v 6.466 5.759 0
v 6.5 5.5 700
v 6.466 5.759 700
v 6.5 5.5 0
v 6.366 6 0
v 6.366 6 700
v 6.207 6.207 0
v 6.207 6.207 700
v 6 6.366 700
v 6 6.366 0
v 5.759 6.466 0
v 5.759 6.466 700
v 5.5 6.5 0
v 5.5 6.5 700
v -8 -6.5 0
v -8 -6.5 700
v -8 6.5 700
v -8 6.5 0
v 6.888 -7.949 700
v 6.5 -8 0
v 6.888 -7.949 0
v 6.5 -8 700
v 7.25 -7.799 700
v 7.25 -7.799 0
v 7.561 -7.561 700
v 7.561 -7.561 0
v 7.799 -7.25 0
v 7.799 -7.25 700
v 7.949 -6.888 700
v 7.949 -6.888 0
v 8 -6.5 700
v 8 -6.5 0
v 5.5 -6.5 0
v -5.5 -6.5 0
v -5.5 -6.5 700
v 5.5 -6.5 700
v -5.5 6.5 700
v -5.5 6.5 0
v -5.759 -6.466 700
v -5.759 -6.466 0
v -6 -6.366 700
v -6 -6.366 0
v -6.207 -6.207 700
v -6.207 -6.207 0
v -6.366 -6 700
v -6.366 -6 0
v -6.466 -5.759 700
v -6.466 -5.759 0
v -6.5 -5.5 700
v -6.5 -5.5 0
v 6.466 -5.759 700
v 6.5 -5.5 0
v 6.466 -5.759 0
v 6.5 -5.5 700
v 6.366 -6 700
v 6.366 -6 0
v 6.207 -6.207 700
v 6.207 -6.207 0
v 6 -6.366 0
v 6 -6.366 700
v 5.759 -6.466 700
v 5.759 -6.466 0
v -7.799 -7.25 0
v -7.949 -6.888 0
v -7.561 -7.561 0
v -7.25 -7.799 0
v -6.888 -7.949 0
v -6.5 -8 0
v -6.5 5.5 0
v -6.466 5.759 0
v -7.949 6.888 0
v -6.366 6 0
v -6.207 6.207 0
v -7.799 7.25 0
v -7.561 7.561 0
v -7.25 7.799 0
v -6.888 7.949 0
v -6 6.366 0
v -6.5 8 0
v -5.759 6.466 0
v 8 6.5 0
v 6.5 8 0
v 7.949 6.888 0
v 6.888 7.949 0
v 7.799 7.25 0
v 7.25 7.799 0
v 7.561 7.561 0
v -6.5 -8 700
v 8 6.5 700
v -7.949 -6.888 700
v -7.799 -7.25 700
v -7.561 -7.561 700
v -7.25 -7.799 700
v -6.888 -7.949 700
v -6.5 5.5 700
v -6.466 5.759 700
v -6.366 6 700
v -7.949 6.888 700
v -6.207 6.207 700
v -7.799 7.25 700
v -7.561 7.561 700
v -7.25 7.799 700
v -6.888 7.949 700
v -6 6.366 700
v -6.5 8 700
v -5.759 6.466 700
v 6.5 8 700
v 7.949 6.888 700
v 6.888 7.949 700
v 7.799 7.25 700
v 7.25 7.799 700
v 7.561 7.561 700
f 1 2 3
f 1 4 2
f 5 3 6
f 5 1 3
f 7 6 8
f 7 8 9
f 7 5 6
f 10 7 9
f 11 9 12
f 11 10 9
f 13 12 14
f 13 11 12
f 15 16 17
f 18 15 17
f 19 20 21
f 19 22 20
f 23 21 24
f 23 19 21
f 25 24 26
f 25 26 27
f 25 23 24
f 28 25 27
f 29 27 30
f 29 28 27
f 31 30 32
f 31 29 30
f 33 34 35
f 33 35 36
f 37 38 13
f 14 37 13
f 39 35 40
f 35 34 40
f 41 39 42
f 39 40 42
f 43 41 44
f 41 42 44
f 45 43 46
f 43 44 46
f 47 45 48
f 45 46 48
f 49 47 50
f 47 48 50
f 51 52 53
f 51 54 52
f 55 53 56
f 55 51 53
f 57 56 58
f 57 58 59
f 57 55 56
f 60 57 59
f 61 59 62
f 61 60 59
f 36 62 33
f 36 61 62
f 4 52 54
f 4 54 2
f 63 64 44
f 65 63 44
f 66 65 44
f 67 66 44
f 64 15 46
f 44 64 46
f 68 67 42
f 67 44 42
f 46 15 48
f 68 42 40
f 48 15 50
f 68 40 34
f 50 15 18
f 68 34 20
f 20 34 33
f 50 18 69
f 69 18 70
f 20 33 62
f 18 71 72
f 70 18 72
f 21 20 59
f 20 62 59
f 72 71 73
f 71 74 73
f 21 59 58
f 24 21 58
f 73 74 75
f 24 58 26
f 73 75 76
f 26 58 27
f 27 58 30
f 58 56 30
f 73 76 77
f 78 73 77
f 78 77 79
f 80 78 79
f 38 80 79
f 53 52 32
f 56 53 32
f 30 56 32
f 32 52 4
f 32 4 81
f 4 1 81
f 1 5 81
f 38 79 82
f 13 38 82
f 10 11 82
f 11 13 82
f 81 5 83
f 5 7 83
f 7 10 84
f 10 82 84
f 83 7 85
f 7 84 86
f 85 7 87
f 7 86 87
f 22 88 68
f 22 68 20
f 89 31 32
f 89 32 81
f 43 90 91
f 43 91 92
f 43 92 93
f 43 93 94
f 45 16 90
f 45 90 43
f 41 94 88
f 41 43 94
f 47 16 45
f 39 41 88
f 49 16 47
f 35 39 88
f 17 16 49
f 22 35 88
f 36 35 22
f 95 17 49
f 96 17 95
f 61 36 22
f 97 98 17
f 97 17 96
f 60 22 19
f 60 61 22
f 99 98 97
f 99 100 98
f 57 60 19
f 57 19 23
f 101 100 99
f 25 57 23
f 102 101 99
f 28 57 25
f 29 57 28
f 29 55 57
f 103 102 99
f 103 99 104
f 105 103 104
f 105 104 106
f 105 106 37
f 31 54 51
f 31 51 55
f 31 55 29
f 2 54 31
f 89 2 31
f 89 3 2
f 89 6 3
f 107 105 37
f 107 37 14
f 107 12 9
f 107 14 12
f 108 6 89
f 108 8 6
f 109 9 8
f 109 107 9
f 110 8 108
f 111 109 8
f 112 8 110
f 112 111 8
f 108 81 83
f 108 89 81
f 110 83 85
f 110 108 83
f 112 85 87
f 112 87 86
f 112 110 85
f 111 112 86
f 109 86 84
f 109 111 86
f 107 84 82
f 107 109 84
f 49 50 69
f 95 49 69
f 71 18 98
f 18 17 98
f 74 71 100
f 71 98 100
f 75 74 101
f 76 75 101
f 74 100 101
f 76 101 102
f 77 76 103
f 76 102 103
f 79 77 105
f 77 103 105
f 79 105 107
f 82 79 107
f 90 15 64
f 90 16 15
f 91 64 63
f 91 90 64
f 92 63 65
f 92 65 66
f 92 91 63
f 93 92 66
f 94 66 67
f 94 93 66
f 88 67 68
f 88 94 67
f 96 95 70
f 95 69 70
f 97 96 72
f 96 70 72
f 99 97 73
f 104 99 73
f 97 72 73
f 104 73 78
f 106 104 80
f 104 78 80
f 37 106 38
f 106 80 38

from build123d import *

# Parameters (mm, degrees)
F0_W     = 16
F0_H     = 16
F1_DEPTH = 700
F2_T     = -1.5
F3_R     = 1.5
F4_R     = 1


with BuildPart() as f1:
    # F0 (on Top) → F1 (new body)
    with BuildSketch(Plane.XY):
        Rectangle(F0_W, F0_H)
    extrude(amount=F1_DEPTH)

    # F2
    f2_openings = [f1.faces().sort_by_distance(p)[0] for p in [
        (0, 0, 700),
        (0, 0, 0),
    ]]
    offset(amount=F2_T, openings=f2_openings)

    # F3
    f3_edges = [f1.edges().sort_by_distance(p)[0] for p in [
        (-8, 8, 350),
        (8, 8, 350),
        (8, -8, 350),
        (-8, -8, 350),
    ]]
    fillet(f3_edges, radius=F3_R)

    # F4
    f4_edges = [f1.edges().sort_by_distance(p)[0] for p in [
        (6.5, 6.5, 350),
        (-6.5, 6.5, 350),
        (-6.5, -6.5, 350),
        (6.5, -6.5, 350),
    ]]
    fillet(f4_edges, radius=F4_R)


solid = f1.part
